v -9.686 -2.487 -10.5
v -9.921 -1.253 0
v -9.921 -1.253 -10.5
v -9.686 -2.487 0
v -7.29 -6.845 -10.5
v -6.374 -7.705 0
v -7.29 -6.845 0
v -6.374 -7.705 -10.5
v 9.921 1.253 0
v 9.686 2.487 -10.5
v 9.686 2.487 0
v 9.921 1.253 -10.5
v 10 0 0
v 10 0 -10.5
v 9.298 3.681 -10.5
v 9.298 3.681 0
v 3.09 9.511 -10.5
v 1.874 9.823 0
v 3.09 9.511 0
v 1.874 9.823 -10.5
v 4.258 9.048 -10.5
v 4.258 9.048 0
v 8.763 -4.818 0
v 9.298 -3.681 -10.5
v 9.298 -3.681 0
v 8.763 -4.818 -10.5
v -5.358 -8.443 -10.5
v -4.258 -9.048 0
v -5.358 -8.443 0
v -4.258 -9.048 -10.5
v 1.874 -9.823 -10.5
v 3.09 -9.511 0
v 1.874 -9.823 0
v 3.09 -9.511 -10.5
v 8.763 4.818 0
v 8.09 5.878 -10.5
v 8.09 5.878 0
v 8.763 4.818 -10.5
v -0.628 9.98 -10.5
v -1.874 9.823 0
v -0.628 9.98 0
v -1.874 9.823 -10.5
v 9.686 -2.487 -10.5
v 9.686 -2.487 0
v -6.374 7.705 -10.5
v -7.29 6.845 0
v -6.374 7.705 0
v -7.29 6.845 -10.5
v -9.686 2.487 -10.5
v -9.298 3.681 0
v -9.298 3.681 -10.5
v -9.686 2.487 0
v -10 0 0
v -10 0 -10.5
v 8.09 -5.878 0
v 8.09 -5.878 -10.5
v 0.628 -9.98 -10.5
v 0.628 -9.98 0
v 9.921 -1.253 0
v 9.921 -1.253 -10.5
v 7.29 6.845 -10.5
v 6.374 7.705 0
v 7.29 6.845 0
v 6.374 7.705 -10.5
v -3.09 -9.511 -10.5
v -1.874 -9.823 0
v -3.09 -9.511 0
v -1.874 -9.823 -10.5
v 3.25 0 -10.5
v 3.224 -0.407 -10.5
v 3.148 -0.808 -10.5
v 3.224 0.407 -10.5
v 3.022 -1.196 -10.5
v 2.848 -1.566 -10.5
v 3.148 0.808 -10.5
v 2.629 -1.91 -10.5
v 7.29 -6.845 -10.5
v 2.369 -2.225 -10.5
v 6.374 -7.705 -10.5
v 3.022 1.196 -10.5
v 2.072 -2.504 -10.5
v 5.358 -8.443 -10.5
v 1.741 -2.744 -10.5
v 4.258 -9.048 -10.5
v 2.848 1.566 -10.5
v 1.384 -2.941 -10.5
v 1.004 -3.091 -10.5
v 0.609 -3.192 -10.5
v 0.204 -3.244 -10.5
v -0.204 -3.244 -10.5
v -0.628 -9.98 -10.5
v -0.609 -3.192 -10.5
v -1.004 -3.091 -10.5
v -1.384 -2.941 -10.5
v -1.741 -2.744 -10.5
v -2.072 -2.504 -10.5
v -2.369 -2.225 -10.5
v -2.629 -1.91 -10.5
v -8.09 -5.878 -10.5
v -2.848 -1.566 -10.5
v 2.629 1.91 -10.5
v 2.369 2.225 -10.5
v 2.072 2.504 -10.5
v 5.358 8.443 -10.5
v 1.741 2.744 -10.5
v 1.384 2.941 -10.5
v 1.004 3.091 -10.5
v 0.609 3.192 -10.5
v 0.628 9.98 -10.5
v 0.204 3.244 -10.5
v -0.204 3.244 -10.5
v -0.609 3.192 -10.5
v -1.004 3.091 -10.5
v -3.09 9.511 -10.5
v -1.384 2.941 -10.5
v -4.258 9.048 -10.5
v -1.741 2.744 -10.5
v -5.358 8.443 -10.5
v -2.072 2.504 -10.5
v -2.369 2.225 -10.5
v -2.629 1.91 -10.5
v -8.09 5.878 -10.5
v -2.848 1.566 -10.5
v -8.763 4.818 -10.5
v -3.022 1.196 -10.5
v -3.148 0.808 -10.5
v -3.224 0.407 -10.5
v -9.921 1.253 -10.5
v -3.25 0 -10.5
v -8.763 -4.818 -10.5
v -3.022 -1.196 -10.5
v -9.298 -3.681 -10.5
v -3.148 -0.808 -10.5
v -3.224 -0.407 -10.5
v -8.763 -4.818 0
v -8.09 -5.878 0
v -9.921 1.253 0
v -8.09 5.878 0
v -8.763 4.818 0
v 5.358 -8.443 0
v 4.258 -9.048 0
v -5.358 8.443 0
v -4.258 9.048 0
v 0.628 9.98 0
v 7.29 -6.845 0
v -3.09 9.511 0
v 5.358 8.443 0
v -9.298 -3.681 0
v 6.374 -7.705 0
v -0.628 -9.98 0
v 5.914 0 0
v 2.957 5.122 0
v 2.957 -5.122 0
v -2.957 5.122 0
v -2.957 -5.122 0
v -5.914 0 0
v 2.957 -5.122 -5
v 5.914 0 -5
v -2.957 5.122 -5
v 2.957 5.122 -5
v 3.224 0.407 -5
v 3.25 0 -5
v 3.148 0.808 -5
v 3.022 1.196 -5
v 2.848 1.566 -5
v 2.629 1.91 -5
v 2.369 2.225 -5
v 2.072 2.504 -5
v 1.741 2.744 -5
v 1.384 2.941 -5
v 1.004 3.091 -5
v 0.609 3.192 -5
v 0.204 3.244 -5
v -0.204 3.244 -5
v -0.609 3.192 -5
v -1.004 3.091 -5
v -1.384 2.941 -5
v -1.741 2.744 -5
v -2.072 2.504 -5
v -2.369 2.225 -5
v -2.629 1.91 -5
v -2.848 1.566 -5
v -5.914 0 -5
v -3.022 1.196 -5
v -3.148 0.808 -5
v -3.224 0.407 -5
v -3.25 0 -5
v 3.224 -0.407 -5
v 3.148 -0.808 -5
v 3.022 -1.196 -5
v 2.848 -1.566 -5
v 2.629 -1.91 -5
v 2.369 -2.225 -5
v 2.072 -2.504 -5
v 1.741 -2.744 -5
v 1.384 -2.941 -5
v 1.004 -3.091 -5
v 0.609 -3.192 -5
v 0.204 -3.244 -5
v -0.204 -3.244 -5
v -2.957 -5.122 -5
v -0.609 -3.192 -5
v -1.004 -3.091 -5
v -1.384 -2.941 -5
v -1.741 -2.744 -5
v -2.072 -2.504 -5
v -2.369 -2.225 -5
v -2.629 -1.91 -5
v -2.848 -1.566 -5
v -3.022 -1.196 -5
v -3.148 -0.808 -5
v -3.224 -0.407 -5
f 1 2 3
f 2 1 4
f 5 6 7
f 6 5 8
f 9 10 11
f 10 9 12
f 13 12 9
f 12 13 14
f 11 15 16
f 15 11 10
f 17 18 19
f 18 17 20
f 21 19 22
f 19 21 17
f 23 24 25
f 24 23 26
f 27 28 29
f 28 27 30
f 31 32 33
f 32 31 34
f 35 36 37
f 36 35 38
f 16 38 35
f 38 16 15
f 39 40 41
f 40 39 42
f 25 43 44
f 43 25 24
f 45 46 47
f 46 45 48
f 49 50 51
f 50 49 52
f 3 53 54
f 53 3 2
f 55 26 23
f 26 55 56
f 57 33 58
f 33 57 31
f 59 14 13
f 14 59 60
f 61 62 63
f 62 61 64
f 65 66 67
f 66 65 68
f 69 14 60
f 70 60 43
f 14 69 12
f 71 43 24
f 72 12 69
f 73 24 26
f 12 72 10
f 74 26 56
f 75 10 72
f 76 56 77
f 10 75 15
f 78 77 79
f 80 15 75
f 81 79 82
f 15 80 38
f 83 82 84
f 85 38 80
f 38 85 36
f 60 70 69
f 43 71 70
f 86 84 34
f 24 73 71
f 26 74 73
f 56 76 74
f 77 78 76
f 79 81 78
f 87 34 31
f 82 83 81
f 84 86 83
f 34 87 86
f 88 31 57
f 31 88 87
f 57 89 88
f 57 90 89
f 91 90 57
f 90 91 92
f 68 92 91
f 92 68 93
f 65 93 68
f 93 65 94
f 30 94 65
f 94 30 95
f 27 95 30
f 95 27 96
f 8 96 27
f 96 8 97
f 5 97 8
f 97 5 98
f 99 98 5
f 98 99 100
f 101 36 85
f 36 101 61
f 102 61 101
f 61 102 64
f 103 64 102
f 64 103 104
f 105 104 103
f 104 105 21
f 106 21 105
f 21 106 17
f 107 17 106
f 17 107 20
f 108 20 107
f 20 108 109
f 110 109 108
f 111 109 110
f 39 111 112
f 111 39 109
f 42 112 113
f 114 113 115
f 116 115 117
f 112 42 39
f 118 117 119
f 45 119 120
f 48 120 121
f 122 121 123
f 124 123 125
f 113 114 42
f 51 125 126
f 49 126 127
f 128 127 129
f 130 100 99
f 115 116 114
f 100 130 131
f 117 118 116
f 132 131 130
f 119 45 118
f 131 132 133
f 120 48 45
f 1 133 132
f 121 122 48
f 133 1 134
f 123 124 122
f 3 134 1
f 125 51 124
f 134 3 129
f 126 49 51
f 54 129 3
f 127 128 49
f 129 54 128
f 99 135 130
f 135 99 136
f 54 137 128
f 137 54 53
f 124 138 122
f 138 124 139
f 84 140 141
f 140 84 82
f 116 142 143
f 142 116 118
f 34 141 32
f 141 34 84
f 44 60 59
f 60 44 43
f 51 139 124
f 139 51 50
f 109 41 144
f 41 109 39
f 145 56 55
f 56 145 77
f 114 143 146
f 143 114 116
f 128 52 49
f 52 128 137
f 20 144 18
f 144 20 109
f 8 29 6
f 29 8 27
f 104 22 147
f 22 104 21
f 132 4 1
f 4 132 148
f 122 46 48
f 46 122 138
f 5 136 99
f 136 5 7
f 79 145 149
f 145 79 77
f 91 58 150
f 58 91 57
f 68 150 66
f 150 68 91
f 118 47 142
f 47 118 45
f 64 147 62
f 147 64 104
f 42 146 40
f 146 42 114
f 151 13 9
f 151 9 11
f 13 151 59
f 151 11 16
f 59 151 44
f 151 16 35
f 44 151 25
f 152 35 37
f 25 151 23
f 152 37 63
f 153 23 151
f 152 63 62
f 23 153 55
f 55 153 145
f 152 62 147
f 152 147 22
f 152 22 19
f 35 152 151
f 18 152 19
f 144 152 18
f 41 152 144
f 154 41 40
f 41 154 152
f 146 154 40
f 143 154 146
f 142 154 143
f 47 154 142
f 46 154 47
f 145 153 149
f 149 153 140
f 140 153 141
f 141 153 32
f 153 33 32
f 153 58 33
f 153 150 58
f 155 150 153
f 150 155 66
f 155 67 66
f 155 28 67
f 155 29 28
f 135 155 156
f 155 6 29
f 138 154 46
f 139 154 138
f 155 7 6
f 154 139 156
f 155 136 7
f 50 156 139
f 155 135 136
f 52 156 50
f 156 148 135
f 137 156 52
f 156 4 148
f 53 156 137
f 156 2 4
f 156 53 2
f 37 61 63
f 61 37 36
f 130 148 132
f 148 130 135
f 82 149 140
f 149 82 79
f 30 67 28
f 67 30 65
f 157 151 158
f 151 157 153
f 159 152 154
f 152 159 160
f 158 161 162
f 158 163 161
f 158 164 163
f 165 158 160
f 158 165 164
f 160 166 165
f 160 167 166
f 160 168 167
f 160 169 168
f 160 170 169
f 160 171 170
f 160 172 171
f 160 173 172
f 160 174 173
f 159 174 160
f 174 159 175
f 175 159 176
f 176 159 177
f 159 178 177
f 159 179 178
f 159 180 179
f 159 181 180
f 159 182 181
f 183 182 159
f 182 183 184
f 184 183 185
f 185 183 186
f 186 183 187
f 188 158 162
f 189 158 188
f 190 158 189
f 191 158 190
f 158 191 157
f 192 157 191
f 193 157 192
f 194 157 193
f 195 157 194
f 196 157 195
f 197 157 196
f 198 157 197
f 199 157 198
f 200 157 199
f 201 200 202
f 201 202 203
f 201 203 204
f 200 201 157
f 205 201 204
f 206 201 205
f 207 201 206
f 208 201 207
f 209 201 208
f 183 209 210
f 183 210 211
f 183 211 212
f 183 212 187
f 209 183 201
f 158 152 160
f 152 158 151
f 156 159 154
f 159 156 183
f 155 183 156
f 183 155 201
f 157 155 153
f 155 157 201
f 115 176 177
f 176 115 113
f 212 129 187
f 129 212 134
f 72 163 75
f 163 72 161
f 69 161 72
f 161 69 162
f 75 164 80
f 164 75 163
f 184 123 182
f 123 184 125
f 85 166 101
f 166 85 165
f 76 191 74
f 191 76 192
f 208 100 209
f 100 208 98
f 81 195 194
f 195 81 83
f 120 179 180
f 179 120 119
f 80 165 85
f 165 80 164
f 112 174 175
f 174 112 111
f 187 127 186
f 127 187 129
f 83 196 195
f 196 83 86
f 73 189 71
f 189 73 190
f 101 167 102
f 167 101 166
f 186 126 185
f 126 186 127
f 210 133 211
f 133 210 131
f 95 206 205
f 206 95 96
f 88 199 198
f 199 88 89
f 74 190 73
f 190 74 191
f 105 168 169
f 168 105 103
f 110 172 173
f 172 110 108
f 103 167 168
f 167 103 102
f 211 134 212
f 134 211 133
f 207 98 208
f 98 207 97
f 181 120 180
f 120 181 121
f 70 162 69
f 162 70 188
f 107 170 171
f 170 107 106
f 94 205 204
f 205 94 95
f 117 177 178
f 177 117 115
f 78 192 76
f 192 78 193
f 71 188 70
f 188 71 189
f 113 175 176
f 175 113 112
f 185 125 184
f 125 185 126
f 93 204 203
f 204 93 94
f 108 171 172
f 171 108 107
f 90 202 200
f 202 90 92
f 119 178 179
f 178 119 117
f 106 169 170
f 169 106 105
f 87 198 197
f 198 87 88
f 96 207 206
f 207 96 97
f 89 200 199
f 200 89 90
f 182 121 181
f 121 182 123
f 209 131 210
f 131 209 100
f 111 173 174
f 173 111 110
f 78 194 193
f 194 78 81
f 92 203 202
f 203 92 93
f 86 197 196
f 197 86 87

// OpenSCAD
$fn = 50;

difference() {
	union() {
		translate(v = [0, 0, -10.5]) {
			cylinder(h = 10.5, r = 10.0);
		}
		#translate(v = [0, 0, -12.0]) {
			cylinder(h = 12, r = 2.875);
		}
	}
	union() {
		translate(v = [0, 0, 0]) {
			rotate(a = [0, 0, 0]) {
				difference() {
					union() {
						translate(v = [0, 0, -5]) {
							linear_extrude(height = 5) {
								polygon(points = [[5.914249999999999, 0.0], [2.957125, 5.1218907443321156], [-2.9571249999999982, 5.1218907443321156], [-5.914249999999999, 7.242867331857232e-16], [-2.9571250000000022, -5.121890744332115], [2.9571249999999956, -5.121890744332118]]);
							}
						}
					}
					union();
				}
			}
		}
		#translate(v = [0, 0, -100.0]) {
			cylinder(h = 200, r = 3.25);
		}
	}
}
